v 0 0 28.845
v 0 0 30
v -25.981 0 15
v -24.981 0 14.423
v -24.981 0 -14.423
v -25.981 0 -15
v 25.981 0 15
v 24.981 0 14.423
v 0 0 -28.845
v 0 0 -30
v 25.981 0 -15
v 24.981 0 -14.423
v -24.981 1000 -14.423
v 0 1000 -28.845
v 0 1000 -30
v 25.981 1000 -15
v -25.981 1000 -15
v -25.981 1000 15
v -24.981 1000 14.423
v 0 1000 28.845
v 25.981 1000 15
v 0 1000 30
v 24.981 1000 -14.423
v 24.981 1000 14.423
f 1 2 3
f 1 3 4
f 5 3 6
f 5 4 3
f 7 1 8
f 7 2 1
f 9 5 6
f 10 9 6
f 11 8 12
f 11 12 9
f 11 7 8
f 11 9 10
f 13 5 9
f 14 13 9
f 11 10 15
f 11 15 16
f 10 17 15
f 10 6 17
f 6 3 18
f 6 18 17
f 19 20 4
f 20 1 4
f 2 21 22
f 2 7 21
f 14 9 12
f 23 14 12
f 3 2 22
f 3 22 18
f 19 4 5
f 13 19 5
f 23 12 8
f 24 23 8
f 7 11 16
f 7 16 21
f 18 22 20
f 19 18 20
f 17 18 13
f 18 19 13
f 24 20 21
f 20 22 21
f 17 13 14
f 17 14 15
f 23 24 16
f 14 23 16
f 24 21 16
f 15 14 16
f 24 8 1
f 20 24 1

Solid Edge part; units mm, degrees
sketch "Sketch1" plane through (0, 0, 0) normal (0, -1, 0) x (1, 0, 0)
  line L0 (0, 30) -> (-25.9808, 15)
  line L1 (-25.9808, 15) -> (-25.9808, -15)
  line L2 (-25.9808, -15) -> (0, -30)
  line L3 (0, -30) -> (25.9808, -15)
  line L4 (25.9808, -15) -> (25.9808, 15)
  line L5 (25.9808, 15) -> (0, 30)
  line L6 (0, 28.8453) -> (-24.9808, 14.4226)
  line L7 (-24.9808, 14.4226) -> (-24.9808, -14.4226)
  line L8 (-24.9808, -14.4226) -> (0, -28.8453)
  line L9 (0, -28.8453) -> (24.9808, -14.4226)
  line L10 (24.9808, -14.4226) -> (24.9808, 14.4226)
  line L11 (24.9808, 14.4226) -> (0, 28.8453)
  dimension "D1" = 1
extrude "Protrusion1" add sketch "Sketch1" against normal blind 1000
